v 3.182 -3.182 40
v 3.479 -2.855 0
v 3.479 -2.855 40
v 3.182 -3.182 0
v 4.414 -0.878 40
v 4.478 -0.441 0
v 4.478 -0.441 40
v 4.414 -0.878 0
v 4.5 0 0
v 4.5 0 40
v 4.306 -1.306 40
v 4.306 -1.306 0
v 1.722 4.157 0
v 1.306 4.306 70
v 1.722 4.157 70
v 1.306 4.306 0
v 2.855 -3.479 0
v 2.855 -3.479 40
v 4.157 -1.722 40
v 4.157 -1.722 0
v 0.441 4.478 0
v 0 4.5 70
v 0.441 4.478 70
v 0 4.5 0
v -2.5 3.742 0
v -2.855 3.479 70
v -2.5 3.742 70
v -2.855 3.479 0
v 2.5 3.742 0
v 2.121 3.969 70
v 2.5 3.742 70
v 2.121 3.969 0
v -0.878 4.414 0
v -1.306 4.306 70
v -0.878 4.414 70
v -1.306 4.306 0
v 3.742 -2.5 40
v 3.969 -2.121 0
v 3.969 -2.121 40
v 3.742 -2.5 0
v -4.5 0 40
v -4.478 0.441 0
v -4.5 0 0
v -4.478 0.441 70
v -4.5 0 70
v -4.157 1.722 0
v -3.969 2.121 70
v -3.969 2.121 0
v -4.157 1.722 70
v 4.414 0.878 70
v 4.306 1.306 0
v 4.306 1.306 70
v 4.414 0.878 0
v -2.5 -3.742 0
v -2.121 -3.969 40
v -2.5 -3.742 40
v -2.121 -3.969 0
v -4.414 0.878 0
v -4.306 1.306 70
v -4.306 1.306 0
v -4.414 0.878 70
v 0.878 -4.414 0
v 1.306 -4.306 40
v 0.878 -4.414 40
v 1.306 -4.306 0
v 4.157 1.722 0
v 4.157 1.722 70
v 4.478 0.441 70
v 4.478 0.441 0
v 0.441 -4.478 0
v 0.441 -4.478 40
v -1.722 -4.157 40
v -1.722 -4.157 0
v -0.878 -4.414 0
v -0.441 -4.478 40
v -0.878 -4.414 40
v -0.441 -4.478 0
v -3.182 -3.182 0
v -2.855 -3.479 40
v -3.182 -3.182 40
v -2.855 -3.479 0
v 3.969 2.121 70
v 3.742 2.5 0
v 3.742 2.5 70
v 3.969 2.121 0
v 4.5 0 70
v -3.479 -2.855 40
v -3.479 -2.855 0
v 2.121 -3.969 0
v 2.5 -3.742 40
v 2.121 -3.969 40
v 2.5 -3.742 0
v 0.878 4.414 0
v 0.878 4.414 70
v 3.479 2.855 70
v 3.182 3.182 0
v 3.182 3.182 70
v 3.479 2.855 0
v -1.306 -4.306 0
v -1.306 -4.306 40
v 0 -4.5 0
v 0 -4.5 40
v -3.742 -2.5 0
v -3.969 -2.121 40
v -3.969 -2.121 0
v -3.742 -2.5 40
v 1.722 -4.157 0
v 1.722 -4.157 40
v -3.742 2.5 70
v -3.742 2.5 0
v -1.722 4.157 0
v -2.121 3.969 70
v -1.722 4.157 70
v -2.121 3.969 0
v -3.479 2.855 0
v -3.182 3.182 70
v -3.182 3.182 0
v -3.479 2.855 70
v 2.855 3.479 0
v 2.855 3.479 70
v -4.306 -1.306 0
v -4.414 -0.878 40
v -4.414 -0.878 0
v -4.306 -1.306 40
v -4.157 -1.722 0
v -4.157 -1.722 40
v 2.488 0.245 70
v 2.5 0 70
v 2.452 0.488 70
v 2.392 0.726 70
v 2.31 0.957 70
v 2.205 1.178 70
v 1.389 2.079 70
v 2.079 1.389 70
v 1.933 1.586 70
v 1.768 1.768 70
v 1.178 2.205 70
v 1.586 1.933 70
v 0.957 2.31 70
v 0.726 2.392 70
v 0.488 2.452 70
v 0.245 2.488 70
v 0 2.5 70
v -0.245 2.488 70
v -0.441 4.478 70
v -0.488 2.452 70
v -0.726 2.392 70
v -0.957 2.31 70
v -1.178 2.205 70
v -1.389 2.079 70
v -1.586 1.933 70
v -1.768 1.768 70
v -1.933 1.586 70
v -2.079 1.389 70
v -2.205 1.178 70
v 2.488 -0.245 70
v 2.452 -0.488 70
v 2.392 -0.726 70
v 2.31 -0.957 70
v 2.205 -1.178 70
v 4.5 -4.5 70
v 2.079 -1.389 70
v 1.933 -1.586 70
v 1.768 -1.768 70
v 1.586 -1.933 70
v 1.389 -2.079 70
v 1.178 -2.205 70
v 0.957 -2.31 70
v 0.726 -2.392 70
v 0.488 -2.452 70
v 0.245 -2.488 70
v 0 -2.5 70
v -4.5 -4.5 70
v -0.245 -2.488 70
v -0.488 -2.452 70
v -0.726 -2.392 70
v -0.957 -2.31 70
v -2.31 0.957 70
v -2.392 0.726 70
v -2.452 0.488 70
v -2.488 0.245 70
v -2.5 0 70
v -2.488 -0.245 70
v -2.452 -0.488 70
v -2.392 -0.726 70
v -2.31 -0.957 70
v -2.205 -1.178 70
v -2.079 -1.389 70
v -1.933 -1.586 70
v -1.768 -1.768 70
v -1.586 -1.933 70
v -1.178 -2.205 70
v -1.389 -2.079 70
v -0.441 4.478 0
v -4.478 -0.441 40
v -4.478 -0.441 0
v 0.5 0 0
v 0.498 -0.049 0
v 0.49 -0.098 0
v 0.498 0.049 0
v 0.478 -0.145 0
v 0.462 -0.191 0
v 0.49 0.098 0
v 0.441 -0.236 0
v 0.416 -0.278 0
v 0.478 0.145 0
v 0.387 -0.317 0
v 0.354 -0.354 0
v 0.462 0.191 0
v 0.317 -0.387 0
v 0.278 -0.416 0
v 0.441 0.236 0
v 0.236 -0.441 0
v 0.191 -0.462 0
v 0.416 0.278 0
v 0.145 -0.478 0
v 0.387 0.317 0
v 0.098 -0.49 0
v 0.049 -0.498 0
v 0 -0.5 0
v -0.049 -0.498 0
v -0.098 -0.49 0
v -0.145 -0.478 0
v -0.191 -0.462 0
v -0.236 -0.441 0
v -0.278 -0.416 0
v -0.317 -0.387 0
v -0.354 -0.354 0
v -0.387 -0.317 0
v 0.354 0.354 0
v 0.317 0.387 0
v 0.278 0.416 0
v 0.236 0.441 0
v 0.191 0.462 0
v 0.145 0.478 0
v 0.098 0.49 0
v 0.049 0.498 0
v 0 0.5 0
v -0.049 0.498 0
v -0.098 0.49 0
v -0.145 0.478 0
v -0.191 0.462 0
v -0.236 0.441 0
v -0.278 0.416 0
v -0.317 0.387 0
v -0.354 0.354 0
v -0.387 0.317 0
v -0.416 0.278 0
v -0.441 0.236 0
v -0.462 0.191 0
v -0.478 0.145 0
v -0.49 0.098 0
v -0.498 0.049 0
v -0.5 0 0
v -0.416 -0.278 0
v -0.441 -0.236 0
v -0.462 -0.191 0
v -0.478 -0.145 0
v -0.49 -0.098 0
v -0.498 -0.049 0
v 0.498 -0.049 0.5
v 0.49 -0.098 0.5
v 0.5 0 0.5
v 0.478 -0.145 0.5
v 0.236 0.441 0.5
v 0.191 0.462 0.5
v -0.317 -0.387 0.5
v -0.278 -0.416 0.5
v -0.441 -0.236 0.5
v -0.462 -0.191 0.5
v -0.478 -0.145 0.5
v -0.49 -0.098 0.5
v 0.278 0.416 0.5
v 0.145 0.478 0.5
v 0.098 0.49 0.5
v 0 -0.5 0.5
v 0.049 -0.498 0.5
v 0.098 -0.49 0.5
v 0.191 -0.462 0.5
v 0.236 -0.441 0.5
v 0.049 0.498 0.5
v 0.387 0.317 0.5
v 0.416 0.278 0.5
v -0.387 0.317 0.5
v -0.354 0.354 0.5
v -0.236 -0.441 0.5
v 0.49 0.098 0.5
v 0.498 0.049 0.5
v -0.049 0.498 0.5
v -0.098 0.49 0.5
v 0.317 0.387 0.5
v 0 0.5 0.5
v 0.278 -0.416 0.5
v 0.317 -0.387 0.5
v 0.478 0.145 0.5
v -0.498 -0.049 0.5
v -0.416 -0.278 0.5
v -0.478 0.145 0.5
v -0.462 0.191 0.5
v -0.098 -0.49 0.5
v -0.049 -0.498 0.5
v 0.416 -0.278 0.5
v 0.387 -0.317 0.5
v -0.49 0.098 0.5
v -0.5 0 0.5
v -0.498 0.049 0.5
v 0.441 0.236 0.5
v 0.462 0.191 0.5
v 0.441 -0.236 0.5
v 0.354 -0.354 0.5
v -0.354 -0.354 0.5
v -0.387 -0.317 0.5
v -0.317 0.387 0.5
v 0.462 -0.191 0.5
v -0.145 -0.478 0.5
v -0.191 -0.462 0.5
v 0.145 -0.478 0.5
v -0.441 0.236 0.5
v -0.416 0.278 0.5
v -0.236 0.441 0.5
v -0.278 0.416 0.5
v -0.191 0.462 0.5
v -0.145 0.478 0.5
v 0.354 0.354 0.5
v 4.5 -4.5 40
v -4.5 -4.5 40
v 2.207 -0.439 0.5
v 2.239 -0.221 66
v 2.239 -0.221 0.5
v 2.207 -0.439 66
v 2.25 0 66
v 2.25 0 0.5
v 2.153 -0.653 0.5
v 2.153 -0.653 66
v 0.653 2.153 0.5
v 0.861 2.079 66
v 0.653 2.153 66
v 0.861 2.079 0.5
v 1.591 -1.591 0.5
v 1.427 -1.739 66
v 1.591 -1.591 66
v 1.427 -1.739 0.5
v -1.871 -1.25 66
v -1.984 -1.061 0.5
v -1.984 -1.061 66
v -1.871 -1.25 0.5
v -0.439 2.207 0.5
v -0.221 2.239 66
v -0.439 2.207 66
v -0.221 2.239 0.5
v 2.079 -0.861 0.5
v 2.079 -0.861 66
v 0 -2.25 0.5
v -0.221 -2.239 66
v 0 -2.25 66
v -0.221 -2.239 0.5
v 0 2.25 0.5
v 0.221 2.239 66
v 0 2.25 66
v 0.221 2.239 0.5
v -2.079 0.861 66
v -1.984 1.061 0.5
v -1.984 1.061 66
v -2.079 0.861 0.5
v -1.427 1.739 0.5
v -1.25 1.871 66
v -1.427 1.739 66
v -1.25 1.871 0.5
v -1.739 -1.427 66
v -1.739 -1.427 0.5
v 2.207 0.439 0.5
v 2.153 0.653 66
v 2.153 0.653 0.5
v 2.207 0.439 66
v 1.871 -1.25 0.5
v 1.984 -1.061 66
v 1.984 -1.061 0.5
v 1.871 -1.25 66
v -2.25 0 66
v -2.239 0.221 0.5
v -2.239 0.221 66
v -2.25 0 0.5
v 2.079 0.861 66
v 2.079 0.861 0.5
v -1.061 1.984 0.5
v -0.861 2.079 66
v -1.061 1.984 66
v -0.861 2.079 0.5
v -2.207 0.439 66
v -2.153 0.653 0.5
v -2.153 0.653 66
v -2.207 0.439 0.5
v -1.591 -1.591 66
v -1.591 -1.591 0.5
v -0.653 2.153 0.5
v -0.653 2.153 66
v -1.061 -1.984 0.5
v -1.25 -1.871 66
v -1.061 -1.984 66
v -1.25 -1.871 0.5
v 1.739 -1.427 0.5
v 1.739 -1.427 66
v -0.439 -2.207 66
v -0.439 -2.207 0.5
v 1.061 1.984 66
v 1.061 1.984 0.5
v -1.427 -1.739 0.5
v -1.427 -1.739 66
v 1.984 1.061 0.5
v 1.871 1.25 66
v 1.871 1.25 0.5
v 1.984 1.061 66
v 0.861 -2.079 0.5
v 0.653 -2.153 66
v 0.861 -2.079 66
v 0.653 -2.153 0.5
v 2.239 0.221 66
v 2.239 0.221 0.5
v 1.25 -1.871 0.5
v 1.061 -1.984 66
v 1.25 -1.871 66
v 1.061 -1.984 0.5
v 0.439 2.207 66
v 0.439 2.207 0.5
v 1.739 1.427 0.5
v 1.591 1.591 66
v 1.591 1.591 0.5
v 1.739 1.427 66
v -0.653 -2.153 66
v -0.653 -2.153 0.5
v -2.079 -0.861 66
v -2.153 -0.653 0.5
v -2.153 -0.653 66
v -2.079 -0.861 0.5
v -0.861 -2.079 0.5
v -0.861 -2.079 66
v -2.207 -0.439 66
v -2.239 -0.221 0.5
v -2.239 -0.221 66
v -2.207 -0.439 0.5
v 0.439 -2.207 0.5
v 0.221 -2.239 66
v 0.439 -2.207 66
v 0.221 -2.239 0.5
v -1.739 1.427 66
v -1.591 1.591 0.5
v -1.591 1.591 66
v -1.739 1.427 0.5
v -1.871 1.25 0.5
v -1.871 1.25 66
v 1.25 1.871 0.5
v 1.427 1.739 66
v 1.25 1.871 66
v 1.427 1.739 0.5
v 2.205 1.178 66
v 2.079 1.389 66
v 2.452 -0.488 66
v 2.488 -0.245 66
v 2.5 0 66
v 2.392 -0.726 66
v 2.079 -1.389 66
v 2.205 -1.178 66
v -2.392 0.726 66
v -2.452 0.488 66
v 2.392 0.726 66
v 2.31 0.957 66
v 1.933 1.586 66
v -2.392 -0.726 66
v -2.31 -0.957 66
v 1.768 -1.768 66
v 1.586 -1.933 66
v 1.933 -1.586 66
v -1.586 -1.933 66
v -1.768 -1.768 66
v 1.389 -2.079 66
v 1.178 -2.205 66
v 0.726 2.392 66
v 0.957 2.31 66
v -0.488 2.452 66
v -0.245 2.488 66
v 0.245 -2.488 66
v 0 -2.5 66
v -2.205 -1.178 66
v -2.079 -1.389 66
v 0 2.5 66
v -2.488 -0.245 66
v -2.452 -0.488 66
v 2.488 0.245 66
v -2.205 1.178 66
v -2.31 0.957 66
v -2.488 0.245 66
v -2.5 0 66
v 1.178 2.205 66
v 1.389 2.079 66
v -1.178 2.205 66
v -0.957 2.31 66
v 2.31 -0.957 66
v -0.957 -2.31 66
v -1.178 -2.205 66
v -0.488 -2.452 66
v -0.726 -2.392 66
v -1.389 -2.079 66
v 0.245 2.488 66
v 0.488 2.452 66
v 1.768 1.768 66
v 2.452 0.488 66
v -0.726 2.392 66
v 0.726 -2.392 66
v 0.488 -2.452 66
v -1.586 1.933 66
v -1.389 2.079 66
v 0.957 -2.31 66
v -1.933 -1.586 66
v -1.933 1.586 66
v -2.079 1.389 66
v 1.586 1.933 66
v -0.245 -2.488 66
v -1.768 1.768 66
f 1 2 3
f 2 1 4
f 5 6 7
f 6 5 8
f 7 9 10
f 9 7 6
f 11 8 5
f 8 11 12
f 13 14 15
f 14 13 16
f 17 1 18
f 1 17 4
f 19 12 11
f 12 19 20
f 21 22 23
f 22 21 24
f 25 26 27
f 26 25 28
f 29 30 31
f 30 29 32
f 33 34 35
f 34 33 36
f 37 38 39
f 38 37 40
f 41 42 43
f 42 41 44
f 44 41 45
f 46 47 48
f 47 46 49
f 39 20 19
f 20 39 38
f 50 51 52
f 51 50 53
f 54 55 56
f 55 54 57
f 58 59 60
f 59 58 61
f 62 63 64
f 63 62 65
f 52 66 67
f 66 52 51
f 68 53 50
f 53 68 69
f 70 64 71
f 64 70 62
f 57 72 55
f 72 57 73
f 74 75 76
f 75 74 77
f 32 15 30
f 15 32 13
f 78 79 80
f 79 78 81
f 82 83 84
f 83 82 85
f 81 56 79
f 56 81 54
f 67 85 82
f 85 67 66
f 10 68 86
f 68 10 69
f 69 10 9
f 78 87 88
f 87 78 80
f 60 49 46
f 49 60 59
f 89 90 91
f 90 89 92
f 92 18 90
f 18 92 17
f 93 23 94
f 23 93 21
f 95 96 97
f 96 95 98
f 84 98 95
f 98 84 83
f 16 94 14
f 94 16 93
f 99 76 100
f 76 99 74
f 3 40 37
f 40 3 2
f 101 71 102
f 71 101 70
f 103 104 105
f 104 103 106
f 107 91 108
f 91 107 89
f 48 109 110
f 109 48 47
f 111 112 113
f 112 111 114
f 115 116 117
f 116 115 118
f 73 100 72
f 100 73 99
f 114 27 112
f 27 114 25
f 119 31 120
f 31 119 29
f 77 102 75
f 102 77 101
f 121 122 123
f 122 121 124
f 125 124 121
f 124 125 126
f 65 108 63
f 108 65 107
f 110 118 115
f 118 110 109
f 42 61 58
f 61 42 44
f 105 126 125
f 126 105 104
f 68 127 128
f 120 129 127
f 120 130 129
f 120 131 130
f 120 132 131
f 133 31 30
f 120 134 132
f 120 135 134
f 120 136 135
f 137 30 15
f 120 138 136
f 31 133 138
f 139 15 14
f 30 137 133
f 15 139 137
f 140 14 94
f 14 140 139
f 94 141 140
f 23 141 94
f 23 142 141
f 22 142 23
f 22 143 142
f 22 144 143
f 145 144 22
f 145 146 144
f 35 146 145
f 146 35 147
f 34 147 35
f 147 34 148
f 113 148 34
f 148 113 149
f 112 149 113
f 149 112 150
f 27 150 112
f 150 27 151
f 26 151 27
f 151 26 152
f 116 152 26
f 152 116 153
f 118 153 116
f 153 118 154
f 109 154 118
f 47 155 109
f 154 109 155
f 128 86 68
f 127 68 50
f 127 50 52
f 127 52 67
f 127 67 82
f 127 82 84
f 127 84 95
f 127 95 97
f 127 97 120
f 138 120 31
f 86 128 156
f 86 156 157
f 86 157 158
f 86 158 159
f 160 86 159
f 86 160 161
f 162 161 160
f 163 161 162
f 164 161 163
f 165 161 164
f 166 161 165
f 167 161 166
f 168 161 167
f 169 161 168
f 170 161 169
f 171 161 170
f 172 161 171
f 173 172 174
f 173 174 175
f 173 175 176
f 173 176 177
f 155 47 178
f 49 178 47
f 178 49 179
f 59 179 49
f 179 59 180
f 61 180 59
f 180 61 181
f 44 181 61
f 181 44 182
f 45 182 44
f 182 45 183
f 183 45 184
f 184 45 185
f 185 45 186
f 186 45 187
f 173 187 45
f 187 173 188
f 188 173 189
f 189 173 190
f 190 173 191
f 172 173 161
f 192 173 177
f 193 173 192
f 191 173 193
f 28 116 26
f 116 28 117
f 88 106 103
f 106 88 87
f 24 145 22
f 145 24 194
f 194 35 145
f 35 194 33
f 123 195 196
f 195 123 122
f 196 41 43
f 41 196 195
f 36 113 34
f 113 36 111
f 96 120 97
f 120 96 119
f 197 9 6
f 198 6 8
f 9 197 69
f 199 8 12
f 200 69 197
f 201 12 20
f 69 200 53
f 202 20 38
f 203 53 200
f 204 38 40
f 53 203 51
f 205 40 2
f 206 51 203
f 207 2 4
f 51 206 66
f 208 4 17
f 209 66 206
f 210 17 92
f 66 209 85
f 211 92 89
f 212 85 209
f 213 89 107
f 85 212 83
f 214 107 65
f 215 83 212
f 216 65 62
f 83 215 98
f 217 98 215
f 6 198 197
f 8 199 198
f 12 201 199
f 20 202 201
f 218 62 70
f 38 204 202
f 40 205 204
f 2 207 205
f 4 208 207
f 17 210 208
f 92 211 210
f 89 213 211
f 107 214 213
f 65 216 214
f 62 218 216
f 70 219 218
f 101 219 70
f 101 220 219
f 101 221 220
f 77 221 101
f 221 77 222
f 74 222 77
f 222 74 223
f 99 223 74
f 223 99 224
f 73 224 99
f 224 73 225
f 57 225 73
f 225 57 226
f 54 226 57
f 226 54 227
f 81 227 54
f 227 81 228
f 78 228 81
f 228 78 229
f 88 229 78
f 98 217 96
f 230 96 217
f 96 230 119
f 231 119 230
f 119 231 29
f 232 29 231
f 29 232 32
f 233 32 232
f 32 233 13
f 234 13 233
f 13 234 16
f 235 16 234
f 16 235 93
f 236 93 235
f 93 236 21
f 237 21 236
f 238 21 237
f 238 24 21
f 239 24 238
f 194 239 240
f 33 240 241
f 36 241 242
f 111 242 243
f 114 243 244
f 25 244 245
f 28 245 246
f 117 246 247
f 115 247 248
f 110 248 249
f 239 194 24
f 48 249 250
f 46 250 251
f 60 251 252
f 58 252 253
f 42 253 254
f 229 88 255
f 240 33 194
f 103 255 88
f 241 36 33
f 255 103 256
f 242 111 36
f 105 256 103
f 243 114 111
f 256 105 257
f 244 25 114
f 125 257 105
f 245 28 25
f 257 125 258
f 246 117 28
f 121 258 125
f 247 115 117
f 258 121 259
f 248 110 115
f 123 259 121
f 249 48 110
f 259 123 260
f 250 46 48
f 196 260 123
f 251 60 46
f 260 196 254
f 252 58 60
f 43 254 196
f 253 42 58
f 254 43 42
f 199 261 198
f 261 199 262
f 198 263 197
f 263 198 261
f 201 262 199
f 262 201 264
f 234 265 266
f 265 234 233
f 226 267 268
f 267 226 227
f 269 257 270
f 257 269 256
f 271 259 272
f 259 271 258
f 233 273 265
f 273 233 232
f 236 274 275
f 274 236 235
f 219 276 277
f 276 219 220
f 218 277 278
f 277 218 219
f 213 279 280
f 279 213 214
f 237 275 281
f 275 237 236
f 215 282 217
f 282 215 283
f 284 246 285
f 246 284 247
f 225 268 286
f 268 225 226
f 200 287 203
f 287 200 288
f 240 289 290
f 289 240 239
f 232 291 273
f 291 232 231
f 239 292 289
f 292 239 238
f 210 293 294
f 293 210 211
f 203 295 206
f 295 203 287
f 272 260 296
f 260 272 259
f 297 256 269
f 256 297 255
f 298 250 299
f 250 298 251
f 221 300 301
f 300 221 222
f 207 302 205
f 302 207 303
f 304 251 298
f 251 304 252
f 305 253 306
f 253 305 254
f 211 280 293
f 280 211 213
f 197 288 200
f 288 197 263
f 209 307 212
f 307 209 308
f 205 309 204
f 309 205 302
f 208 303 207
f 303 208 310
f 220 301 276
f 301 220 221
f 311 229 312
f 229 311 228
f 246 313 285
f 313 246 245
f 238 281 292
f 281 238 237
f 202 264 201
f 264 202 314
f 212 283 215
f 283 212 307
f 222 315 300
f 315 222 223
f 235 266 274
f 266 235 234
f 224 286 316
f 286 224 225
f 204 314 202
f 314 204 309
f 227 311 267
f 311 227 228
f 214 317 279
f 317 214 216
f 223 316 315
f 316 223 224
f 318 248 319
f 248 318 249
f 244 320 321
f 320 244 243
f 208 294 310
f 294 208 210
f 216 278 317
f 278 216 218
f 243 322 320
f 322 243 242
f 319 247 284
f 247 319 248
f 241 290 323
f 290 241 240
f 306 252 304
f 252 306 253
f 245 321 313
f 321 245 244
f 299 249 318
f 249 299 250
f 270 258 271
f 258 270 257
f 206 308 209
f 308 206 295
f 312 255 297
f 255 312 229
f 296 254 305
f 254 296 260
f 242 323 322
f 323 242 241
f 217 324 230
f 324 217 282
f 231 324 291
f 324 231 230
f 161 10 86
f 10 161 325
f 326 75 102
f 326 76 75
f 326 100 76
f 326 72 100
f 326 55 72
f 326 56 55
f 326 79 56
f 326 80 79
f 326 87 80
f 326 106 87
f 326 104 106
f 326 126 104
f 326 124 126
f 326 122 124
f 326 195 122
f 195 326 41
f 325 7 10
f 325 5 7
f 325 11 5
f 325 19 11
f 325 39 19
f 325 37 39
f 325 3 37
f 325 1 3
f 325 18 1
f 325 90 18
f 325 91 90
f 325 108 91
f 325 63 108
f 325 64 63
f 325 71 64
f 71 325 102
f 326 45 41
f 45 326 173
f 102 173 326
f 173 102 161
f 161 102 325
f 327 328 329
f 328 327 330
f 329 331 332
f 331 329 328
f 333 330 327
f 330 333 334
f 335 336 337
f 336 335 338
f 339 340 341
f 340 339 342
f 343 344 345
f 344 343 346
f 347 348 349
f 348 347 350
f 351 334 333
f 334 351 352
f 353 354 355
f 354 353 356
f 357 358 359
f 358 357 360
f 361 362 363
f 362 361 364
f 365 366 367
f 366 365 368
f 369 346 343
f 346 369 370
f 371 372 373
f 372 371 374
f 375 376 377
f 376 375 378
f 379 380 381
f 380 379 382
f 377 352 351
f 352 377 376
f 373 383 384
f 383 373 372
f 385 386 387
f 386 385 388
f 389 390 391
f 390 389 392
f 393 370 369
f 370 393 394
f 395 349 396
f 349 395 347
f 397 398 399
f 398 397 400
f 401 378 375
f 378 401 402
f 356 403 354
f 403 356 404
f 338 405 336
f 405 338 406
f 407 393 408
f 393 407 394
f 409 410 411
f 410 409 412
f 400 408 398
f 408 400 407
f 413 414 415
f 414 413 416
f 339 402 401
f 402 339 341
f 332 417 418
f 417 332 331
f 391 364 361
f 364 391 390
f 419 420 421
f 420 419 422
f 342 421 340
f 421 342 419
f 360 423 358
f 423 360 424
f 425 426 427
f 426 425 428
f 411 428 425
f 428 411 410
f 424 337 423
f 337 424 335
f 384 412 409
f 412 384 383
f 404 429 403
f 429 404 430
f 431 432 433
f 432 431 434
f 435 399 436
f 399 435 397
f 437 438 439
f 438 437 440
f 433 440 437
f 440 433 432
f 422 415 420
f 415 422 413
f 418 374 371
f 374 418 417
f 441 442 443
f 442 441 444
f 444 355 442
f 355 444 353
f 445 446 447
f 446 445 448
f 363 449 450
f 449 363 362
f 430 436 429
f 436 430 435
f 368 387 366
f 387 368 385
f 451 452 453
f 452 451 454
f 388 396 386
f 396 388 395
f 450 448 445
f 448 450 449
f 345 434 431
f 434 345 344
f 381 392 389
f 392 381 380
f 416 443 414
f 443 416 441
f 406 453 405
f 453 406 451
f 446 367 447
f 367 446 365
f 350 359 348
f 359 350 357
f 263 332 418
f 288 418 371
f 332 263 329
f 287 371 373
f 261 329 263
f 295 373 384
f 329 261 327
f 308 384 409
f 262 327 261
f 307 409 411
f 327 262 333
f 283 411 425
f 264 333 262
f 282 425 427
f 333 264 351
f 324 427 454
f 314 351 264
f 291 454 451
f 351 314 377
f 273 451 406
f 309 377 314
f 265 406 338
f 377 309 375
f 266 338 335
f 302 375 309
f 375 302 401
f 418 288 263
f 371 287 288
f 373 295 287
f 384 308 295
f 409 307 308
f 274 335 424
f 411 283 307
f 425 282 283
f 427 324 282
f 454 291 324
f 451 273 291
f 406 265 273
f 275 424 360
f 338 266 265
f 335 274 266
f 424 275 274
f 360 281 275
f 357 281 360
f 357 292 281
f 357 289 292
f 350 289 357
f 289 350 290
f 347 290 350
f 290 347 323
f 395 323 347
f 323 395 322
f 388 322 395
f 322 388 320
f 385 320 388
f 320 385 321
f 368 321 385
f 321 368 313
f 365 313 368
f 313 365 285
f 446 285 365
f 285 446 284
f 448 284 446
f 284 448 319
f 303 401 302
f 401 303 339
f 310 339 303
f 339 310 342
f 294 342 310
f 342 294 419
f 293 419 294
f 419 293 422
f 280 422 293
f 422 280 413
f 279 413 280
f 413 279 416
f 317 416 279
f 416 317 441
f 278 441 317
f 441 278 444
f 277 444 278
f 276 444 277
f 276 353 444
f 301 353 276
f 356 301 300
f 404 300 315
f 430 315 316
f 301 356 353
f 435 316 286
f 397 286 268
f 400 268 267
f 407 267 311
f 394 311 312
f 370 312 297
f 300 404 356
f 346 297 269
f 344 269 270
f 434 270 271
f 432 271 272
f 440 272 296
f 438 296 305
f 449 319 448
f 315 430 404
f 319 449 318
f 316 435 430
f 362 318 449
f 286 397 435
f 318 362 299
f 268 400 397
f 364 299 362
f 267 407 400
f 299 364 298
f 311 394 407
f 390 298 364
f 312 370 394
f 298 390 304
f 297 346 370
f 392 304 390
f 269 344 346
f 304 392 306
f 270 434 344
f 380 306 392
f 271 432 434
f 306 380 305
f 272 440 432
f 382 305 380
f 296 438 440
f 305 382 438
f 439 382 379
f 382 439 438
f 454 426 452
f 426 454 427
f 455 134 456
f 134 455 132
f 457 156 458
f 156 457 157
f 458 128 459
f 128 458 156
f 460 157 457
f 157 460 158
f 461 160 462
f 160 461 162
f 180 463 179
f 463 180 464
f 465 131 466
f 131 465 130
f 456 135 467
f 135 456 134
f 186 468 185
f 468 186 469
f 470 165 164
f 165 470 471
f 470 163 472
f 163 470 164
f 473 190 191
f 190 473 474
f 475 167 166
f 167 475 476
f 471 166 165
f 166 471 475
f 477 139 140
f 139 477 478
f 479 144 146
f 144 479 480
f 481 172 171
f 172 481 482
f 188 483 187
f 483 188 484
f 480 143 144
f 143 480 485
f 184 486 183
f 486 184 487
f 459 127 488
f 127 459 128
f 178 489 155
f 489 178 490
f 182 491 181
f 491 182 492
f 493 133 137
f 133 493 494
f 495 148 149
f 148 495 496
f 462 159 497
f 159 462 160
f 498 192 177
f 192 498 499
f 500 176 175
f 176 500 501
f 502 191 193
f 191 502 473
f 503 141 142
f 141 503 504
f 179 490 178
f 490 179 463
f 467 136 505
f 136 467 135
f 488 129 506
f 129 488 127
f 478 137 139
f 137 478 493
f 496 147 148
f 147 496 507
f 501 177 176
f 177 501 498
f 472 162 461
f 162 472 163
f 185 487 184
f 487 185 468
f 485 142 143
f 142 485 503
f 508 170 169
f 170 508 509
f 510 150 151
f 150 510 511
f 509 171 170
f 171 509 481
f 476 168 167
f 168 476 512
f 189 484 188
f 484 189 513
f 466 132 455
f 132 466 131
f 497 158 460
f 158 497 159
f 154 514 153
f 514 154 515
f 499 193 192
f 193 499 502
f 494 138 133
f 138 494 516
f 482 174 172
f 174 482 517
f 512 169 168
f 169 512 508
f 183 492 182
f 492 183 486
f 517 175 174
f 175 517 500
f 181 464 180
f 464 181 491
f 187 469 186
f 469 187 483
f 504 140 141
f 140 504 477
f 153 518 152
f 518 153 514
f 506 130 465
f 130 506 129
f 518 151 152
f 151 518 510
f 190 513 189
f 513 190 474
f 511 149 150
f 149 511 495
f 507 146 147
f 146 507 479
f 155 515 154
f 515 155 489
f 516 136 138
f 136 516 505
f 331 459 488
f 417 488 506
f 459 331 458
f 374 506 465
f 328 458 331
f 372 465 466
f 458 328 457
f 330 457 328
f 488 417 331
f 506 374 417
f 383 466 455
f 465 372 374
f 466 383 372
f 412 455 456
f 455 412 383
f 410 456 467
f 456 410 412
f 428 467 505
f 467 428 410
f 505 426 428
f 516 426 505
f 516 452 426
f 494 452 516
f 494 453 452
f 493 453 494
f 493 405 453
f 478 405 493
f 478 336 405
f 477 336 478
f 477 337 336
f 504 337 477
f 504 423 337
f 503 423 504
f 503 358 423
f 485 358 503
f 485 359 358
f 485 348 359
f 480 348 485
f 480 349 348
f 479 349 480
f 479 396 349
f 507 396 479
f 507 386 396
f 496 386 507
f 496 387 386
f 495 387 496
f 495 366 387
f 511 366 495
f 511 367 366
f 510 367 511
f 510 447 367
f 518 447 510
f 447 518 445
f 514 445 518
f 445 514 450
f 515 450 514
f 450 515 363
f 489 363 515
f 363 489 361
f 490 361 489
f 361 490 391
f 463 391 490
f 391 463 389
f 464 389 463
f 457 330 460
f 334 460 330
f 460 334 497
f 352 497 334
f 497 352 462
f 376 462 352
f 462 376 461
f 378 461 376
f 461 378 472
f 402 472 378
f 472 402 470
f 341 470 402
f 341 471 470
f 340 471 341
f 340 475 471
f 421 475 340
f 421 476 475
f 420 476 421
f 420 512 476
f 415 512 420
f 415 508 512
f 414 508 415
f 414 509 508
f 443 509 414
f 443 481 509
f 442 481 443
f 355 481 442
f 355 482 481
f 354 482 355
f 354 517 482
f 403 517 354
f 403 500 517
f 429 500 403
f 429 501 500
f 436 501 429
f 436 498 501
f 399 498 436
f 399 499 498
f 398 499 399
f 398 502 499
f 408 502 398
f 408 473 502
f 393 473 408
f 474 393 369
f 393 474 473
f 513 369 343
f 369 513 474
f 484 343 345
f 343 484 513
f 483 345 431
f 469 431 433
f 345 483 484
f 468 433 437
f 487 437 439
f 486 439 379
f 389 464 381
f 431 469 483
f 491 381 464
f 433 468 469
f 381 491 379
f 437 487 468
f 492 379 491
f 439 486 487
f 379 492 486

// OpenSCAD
ldrDiameter = 5;
ldrHeight = 2;

bodyLength = 70;
bodyShellWidth = 2;
bodyOuterDiameter = ldrDiameter + (bodyShellWidth * 2);

pinholeDiameter = 1.0;
pinholeLength = 0.5;

supportLength = 30;

backOpeningLength = 2;

rotate([180, 0, 0]) {
    translate([0, 0, -bodyLength]) {
        difference() {
            difference() {
                union() {
                // Support
                translate([-(bodyOuterDiameter / 2), 0, 0])
                    cube([bodyOuterDiameter, (bodyOuterDiameter / 2), supportLength]);

                    difference() {
                        // Main body
                        cylinder(h = bodyLength, d = bodyOuterDiameter, center = false, $fn = 64);
                    
                        // Pinhole
                        translate([0, 0, (bodyLength - 2)])
                            cylinder(h = (pinholeLength * 6), d = pinholeDiameter, center = false, $fn = 64);       
                    }
                }

                // Main hole
                translate([0, 0, -pinholeLength])
                    cylinder(h = bodyLength, d = (ldrDiameter - 0.5), center = false, $fn = 64);
            }
            
            // LDR socket
            translate([0, 0, -1])
                cylinder(h = (ldrHeight + backOpeningLength + 1), d = ldrDiameter, center = false, $fn = 64);
        }
    }
}
